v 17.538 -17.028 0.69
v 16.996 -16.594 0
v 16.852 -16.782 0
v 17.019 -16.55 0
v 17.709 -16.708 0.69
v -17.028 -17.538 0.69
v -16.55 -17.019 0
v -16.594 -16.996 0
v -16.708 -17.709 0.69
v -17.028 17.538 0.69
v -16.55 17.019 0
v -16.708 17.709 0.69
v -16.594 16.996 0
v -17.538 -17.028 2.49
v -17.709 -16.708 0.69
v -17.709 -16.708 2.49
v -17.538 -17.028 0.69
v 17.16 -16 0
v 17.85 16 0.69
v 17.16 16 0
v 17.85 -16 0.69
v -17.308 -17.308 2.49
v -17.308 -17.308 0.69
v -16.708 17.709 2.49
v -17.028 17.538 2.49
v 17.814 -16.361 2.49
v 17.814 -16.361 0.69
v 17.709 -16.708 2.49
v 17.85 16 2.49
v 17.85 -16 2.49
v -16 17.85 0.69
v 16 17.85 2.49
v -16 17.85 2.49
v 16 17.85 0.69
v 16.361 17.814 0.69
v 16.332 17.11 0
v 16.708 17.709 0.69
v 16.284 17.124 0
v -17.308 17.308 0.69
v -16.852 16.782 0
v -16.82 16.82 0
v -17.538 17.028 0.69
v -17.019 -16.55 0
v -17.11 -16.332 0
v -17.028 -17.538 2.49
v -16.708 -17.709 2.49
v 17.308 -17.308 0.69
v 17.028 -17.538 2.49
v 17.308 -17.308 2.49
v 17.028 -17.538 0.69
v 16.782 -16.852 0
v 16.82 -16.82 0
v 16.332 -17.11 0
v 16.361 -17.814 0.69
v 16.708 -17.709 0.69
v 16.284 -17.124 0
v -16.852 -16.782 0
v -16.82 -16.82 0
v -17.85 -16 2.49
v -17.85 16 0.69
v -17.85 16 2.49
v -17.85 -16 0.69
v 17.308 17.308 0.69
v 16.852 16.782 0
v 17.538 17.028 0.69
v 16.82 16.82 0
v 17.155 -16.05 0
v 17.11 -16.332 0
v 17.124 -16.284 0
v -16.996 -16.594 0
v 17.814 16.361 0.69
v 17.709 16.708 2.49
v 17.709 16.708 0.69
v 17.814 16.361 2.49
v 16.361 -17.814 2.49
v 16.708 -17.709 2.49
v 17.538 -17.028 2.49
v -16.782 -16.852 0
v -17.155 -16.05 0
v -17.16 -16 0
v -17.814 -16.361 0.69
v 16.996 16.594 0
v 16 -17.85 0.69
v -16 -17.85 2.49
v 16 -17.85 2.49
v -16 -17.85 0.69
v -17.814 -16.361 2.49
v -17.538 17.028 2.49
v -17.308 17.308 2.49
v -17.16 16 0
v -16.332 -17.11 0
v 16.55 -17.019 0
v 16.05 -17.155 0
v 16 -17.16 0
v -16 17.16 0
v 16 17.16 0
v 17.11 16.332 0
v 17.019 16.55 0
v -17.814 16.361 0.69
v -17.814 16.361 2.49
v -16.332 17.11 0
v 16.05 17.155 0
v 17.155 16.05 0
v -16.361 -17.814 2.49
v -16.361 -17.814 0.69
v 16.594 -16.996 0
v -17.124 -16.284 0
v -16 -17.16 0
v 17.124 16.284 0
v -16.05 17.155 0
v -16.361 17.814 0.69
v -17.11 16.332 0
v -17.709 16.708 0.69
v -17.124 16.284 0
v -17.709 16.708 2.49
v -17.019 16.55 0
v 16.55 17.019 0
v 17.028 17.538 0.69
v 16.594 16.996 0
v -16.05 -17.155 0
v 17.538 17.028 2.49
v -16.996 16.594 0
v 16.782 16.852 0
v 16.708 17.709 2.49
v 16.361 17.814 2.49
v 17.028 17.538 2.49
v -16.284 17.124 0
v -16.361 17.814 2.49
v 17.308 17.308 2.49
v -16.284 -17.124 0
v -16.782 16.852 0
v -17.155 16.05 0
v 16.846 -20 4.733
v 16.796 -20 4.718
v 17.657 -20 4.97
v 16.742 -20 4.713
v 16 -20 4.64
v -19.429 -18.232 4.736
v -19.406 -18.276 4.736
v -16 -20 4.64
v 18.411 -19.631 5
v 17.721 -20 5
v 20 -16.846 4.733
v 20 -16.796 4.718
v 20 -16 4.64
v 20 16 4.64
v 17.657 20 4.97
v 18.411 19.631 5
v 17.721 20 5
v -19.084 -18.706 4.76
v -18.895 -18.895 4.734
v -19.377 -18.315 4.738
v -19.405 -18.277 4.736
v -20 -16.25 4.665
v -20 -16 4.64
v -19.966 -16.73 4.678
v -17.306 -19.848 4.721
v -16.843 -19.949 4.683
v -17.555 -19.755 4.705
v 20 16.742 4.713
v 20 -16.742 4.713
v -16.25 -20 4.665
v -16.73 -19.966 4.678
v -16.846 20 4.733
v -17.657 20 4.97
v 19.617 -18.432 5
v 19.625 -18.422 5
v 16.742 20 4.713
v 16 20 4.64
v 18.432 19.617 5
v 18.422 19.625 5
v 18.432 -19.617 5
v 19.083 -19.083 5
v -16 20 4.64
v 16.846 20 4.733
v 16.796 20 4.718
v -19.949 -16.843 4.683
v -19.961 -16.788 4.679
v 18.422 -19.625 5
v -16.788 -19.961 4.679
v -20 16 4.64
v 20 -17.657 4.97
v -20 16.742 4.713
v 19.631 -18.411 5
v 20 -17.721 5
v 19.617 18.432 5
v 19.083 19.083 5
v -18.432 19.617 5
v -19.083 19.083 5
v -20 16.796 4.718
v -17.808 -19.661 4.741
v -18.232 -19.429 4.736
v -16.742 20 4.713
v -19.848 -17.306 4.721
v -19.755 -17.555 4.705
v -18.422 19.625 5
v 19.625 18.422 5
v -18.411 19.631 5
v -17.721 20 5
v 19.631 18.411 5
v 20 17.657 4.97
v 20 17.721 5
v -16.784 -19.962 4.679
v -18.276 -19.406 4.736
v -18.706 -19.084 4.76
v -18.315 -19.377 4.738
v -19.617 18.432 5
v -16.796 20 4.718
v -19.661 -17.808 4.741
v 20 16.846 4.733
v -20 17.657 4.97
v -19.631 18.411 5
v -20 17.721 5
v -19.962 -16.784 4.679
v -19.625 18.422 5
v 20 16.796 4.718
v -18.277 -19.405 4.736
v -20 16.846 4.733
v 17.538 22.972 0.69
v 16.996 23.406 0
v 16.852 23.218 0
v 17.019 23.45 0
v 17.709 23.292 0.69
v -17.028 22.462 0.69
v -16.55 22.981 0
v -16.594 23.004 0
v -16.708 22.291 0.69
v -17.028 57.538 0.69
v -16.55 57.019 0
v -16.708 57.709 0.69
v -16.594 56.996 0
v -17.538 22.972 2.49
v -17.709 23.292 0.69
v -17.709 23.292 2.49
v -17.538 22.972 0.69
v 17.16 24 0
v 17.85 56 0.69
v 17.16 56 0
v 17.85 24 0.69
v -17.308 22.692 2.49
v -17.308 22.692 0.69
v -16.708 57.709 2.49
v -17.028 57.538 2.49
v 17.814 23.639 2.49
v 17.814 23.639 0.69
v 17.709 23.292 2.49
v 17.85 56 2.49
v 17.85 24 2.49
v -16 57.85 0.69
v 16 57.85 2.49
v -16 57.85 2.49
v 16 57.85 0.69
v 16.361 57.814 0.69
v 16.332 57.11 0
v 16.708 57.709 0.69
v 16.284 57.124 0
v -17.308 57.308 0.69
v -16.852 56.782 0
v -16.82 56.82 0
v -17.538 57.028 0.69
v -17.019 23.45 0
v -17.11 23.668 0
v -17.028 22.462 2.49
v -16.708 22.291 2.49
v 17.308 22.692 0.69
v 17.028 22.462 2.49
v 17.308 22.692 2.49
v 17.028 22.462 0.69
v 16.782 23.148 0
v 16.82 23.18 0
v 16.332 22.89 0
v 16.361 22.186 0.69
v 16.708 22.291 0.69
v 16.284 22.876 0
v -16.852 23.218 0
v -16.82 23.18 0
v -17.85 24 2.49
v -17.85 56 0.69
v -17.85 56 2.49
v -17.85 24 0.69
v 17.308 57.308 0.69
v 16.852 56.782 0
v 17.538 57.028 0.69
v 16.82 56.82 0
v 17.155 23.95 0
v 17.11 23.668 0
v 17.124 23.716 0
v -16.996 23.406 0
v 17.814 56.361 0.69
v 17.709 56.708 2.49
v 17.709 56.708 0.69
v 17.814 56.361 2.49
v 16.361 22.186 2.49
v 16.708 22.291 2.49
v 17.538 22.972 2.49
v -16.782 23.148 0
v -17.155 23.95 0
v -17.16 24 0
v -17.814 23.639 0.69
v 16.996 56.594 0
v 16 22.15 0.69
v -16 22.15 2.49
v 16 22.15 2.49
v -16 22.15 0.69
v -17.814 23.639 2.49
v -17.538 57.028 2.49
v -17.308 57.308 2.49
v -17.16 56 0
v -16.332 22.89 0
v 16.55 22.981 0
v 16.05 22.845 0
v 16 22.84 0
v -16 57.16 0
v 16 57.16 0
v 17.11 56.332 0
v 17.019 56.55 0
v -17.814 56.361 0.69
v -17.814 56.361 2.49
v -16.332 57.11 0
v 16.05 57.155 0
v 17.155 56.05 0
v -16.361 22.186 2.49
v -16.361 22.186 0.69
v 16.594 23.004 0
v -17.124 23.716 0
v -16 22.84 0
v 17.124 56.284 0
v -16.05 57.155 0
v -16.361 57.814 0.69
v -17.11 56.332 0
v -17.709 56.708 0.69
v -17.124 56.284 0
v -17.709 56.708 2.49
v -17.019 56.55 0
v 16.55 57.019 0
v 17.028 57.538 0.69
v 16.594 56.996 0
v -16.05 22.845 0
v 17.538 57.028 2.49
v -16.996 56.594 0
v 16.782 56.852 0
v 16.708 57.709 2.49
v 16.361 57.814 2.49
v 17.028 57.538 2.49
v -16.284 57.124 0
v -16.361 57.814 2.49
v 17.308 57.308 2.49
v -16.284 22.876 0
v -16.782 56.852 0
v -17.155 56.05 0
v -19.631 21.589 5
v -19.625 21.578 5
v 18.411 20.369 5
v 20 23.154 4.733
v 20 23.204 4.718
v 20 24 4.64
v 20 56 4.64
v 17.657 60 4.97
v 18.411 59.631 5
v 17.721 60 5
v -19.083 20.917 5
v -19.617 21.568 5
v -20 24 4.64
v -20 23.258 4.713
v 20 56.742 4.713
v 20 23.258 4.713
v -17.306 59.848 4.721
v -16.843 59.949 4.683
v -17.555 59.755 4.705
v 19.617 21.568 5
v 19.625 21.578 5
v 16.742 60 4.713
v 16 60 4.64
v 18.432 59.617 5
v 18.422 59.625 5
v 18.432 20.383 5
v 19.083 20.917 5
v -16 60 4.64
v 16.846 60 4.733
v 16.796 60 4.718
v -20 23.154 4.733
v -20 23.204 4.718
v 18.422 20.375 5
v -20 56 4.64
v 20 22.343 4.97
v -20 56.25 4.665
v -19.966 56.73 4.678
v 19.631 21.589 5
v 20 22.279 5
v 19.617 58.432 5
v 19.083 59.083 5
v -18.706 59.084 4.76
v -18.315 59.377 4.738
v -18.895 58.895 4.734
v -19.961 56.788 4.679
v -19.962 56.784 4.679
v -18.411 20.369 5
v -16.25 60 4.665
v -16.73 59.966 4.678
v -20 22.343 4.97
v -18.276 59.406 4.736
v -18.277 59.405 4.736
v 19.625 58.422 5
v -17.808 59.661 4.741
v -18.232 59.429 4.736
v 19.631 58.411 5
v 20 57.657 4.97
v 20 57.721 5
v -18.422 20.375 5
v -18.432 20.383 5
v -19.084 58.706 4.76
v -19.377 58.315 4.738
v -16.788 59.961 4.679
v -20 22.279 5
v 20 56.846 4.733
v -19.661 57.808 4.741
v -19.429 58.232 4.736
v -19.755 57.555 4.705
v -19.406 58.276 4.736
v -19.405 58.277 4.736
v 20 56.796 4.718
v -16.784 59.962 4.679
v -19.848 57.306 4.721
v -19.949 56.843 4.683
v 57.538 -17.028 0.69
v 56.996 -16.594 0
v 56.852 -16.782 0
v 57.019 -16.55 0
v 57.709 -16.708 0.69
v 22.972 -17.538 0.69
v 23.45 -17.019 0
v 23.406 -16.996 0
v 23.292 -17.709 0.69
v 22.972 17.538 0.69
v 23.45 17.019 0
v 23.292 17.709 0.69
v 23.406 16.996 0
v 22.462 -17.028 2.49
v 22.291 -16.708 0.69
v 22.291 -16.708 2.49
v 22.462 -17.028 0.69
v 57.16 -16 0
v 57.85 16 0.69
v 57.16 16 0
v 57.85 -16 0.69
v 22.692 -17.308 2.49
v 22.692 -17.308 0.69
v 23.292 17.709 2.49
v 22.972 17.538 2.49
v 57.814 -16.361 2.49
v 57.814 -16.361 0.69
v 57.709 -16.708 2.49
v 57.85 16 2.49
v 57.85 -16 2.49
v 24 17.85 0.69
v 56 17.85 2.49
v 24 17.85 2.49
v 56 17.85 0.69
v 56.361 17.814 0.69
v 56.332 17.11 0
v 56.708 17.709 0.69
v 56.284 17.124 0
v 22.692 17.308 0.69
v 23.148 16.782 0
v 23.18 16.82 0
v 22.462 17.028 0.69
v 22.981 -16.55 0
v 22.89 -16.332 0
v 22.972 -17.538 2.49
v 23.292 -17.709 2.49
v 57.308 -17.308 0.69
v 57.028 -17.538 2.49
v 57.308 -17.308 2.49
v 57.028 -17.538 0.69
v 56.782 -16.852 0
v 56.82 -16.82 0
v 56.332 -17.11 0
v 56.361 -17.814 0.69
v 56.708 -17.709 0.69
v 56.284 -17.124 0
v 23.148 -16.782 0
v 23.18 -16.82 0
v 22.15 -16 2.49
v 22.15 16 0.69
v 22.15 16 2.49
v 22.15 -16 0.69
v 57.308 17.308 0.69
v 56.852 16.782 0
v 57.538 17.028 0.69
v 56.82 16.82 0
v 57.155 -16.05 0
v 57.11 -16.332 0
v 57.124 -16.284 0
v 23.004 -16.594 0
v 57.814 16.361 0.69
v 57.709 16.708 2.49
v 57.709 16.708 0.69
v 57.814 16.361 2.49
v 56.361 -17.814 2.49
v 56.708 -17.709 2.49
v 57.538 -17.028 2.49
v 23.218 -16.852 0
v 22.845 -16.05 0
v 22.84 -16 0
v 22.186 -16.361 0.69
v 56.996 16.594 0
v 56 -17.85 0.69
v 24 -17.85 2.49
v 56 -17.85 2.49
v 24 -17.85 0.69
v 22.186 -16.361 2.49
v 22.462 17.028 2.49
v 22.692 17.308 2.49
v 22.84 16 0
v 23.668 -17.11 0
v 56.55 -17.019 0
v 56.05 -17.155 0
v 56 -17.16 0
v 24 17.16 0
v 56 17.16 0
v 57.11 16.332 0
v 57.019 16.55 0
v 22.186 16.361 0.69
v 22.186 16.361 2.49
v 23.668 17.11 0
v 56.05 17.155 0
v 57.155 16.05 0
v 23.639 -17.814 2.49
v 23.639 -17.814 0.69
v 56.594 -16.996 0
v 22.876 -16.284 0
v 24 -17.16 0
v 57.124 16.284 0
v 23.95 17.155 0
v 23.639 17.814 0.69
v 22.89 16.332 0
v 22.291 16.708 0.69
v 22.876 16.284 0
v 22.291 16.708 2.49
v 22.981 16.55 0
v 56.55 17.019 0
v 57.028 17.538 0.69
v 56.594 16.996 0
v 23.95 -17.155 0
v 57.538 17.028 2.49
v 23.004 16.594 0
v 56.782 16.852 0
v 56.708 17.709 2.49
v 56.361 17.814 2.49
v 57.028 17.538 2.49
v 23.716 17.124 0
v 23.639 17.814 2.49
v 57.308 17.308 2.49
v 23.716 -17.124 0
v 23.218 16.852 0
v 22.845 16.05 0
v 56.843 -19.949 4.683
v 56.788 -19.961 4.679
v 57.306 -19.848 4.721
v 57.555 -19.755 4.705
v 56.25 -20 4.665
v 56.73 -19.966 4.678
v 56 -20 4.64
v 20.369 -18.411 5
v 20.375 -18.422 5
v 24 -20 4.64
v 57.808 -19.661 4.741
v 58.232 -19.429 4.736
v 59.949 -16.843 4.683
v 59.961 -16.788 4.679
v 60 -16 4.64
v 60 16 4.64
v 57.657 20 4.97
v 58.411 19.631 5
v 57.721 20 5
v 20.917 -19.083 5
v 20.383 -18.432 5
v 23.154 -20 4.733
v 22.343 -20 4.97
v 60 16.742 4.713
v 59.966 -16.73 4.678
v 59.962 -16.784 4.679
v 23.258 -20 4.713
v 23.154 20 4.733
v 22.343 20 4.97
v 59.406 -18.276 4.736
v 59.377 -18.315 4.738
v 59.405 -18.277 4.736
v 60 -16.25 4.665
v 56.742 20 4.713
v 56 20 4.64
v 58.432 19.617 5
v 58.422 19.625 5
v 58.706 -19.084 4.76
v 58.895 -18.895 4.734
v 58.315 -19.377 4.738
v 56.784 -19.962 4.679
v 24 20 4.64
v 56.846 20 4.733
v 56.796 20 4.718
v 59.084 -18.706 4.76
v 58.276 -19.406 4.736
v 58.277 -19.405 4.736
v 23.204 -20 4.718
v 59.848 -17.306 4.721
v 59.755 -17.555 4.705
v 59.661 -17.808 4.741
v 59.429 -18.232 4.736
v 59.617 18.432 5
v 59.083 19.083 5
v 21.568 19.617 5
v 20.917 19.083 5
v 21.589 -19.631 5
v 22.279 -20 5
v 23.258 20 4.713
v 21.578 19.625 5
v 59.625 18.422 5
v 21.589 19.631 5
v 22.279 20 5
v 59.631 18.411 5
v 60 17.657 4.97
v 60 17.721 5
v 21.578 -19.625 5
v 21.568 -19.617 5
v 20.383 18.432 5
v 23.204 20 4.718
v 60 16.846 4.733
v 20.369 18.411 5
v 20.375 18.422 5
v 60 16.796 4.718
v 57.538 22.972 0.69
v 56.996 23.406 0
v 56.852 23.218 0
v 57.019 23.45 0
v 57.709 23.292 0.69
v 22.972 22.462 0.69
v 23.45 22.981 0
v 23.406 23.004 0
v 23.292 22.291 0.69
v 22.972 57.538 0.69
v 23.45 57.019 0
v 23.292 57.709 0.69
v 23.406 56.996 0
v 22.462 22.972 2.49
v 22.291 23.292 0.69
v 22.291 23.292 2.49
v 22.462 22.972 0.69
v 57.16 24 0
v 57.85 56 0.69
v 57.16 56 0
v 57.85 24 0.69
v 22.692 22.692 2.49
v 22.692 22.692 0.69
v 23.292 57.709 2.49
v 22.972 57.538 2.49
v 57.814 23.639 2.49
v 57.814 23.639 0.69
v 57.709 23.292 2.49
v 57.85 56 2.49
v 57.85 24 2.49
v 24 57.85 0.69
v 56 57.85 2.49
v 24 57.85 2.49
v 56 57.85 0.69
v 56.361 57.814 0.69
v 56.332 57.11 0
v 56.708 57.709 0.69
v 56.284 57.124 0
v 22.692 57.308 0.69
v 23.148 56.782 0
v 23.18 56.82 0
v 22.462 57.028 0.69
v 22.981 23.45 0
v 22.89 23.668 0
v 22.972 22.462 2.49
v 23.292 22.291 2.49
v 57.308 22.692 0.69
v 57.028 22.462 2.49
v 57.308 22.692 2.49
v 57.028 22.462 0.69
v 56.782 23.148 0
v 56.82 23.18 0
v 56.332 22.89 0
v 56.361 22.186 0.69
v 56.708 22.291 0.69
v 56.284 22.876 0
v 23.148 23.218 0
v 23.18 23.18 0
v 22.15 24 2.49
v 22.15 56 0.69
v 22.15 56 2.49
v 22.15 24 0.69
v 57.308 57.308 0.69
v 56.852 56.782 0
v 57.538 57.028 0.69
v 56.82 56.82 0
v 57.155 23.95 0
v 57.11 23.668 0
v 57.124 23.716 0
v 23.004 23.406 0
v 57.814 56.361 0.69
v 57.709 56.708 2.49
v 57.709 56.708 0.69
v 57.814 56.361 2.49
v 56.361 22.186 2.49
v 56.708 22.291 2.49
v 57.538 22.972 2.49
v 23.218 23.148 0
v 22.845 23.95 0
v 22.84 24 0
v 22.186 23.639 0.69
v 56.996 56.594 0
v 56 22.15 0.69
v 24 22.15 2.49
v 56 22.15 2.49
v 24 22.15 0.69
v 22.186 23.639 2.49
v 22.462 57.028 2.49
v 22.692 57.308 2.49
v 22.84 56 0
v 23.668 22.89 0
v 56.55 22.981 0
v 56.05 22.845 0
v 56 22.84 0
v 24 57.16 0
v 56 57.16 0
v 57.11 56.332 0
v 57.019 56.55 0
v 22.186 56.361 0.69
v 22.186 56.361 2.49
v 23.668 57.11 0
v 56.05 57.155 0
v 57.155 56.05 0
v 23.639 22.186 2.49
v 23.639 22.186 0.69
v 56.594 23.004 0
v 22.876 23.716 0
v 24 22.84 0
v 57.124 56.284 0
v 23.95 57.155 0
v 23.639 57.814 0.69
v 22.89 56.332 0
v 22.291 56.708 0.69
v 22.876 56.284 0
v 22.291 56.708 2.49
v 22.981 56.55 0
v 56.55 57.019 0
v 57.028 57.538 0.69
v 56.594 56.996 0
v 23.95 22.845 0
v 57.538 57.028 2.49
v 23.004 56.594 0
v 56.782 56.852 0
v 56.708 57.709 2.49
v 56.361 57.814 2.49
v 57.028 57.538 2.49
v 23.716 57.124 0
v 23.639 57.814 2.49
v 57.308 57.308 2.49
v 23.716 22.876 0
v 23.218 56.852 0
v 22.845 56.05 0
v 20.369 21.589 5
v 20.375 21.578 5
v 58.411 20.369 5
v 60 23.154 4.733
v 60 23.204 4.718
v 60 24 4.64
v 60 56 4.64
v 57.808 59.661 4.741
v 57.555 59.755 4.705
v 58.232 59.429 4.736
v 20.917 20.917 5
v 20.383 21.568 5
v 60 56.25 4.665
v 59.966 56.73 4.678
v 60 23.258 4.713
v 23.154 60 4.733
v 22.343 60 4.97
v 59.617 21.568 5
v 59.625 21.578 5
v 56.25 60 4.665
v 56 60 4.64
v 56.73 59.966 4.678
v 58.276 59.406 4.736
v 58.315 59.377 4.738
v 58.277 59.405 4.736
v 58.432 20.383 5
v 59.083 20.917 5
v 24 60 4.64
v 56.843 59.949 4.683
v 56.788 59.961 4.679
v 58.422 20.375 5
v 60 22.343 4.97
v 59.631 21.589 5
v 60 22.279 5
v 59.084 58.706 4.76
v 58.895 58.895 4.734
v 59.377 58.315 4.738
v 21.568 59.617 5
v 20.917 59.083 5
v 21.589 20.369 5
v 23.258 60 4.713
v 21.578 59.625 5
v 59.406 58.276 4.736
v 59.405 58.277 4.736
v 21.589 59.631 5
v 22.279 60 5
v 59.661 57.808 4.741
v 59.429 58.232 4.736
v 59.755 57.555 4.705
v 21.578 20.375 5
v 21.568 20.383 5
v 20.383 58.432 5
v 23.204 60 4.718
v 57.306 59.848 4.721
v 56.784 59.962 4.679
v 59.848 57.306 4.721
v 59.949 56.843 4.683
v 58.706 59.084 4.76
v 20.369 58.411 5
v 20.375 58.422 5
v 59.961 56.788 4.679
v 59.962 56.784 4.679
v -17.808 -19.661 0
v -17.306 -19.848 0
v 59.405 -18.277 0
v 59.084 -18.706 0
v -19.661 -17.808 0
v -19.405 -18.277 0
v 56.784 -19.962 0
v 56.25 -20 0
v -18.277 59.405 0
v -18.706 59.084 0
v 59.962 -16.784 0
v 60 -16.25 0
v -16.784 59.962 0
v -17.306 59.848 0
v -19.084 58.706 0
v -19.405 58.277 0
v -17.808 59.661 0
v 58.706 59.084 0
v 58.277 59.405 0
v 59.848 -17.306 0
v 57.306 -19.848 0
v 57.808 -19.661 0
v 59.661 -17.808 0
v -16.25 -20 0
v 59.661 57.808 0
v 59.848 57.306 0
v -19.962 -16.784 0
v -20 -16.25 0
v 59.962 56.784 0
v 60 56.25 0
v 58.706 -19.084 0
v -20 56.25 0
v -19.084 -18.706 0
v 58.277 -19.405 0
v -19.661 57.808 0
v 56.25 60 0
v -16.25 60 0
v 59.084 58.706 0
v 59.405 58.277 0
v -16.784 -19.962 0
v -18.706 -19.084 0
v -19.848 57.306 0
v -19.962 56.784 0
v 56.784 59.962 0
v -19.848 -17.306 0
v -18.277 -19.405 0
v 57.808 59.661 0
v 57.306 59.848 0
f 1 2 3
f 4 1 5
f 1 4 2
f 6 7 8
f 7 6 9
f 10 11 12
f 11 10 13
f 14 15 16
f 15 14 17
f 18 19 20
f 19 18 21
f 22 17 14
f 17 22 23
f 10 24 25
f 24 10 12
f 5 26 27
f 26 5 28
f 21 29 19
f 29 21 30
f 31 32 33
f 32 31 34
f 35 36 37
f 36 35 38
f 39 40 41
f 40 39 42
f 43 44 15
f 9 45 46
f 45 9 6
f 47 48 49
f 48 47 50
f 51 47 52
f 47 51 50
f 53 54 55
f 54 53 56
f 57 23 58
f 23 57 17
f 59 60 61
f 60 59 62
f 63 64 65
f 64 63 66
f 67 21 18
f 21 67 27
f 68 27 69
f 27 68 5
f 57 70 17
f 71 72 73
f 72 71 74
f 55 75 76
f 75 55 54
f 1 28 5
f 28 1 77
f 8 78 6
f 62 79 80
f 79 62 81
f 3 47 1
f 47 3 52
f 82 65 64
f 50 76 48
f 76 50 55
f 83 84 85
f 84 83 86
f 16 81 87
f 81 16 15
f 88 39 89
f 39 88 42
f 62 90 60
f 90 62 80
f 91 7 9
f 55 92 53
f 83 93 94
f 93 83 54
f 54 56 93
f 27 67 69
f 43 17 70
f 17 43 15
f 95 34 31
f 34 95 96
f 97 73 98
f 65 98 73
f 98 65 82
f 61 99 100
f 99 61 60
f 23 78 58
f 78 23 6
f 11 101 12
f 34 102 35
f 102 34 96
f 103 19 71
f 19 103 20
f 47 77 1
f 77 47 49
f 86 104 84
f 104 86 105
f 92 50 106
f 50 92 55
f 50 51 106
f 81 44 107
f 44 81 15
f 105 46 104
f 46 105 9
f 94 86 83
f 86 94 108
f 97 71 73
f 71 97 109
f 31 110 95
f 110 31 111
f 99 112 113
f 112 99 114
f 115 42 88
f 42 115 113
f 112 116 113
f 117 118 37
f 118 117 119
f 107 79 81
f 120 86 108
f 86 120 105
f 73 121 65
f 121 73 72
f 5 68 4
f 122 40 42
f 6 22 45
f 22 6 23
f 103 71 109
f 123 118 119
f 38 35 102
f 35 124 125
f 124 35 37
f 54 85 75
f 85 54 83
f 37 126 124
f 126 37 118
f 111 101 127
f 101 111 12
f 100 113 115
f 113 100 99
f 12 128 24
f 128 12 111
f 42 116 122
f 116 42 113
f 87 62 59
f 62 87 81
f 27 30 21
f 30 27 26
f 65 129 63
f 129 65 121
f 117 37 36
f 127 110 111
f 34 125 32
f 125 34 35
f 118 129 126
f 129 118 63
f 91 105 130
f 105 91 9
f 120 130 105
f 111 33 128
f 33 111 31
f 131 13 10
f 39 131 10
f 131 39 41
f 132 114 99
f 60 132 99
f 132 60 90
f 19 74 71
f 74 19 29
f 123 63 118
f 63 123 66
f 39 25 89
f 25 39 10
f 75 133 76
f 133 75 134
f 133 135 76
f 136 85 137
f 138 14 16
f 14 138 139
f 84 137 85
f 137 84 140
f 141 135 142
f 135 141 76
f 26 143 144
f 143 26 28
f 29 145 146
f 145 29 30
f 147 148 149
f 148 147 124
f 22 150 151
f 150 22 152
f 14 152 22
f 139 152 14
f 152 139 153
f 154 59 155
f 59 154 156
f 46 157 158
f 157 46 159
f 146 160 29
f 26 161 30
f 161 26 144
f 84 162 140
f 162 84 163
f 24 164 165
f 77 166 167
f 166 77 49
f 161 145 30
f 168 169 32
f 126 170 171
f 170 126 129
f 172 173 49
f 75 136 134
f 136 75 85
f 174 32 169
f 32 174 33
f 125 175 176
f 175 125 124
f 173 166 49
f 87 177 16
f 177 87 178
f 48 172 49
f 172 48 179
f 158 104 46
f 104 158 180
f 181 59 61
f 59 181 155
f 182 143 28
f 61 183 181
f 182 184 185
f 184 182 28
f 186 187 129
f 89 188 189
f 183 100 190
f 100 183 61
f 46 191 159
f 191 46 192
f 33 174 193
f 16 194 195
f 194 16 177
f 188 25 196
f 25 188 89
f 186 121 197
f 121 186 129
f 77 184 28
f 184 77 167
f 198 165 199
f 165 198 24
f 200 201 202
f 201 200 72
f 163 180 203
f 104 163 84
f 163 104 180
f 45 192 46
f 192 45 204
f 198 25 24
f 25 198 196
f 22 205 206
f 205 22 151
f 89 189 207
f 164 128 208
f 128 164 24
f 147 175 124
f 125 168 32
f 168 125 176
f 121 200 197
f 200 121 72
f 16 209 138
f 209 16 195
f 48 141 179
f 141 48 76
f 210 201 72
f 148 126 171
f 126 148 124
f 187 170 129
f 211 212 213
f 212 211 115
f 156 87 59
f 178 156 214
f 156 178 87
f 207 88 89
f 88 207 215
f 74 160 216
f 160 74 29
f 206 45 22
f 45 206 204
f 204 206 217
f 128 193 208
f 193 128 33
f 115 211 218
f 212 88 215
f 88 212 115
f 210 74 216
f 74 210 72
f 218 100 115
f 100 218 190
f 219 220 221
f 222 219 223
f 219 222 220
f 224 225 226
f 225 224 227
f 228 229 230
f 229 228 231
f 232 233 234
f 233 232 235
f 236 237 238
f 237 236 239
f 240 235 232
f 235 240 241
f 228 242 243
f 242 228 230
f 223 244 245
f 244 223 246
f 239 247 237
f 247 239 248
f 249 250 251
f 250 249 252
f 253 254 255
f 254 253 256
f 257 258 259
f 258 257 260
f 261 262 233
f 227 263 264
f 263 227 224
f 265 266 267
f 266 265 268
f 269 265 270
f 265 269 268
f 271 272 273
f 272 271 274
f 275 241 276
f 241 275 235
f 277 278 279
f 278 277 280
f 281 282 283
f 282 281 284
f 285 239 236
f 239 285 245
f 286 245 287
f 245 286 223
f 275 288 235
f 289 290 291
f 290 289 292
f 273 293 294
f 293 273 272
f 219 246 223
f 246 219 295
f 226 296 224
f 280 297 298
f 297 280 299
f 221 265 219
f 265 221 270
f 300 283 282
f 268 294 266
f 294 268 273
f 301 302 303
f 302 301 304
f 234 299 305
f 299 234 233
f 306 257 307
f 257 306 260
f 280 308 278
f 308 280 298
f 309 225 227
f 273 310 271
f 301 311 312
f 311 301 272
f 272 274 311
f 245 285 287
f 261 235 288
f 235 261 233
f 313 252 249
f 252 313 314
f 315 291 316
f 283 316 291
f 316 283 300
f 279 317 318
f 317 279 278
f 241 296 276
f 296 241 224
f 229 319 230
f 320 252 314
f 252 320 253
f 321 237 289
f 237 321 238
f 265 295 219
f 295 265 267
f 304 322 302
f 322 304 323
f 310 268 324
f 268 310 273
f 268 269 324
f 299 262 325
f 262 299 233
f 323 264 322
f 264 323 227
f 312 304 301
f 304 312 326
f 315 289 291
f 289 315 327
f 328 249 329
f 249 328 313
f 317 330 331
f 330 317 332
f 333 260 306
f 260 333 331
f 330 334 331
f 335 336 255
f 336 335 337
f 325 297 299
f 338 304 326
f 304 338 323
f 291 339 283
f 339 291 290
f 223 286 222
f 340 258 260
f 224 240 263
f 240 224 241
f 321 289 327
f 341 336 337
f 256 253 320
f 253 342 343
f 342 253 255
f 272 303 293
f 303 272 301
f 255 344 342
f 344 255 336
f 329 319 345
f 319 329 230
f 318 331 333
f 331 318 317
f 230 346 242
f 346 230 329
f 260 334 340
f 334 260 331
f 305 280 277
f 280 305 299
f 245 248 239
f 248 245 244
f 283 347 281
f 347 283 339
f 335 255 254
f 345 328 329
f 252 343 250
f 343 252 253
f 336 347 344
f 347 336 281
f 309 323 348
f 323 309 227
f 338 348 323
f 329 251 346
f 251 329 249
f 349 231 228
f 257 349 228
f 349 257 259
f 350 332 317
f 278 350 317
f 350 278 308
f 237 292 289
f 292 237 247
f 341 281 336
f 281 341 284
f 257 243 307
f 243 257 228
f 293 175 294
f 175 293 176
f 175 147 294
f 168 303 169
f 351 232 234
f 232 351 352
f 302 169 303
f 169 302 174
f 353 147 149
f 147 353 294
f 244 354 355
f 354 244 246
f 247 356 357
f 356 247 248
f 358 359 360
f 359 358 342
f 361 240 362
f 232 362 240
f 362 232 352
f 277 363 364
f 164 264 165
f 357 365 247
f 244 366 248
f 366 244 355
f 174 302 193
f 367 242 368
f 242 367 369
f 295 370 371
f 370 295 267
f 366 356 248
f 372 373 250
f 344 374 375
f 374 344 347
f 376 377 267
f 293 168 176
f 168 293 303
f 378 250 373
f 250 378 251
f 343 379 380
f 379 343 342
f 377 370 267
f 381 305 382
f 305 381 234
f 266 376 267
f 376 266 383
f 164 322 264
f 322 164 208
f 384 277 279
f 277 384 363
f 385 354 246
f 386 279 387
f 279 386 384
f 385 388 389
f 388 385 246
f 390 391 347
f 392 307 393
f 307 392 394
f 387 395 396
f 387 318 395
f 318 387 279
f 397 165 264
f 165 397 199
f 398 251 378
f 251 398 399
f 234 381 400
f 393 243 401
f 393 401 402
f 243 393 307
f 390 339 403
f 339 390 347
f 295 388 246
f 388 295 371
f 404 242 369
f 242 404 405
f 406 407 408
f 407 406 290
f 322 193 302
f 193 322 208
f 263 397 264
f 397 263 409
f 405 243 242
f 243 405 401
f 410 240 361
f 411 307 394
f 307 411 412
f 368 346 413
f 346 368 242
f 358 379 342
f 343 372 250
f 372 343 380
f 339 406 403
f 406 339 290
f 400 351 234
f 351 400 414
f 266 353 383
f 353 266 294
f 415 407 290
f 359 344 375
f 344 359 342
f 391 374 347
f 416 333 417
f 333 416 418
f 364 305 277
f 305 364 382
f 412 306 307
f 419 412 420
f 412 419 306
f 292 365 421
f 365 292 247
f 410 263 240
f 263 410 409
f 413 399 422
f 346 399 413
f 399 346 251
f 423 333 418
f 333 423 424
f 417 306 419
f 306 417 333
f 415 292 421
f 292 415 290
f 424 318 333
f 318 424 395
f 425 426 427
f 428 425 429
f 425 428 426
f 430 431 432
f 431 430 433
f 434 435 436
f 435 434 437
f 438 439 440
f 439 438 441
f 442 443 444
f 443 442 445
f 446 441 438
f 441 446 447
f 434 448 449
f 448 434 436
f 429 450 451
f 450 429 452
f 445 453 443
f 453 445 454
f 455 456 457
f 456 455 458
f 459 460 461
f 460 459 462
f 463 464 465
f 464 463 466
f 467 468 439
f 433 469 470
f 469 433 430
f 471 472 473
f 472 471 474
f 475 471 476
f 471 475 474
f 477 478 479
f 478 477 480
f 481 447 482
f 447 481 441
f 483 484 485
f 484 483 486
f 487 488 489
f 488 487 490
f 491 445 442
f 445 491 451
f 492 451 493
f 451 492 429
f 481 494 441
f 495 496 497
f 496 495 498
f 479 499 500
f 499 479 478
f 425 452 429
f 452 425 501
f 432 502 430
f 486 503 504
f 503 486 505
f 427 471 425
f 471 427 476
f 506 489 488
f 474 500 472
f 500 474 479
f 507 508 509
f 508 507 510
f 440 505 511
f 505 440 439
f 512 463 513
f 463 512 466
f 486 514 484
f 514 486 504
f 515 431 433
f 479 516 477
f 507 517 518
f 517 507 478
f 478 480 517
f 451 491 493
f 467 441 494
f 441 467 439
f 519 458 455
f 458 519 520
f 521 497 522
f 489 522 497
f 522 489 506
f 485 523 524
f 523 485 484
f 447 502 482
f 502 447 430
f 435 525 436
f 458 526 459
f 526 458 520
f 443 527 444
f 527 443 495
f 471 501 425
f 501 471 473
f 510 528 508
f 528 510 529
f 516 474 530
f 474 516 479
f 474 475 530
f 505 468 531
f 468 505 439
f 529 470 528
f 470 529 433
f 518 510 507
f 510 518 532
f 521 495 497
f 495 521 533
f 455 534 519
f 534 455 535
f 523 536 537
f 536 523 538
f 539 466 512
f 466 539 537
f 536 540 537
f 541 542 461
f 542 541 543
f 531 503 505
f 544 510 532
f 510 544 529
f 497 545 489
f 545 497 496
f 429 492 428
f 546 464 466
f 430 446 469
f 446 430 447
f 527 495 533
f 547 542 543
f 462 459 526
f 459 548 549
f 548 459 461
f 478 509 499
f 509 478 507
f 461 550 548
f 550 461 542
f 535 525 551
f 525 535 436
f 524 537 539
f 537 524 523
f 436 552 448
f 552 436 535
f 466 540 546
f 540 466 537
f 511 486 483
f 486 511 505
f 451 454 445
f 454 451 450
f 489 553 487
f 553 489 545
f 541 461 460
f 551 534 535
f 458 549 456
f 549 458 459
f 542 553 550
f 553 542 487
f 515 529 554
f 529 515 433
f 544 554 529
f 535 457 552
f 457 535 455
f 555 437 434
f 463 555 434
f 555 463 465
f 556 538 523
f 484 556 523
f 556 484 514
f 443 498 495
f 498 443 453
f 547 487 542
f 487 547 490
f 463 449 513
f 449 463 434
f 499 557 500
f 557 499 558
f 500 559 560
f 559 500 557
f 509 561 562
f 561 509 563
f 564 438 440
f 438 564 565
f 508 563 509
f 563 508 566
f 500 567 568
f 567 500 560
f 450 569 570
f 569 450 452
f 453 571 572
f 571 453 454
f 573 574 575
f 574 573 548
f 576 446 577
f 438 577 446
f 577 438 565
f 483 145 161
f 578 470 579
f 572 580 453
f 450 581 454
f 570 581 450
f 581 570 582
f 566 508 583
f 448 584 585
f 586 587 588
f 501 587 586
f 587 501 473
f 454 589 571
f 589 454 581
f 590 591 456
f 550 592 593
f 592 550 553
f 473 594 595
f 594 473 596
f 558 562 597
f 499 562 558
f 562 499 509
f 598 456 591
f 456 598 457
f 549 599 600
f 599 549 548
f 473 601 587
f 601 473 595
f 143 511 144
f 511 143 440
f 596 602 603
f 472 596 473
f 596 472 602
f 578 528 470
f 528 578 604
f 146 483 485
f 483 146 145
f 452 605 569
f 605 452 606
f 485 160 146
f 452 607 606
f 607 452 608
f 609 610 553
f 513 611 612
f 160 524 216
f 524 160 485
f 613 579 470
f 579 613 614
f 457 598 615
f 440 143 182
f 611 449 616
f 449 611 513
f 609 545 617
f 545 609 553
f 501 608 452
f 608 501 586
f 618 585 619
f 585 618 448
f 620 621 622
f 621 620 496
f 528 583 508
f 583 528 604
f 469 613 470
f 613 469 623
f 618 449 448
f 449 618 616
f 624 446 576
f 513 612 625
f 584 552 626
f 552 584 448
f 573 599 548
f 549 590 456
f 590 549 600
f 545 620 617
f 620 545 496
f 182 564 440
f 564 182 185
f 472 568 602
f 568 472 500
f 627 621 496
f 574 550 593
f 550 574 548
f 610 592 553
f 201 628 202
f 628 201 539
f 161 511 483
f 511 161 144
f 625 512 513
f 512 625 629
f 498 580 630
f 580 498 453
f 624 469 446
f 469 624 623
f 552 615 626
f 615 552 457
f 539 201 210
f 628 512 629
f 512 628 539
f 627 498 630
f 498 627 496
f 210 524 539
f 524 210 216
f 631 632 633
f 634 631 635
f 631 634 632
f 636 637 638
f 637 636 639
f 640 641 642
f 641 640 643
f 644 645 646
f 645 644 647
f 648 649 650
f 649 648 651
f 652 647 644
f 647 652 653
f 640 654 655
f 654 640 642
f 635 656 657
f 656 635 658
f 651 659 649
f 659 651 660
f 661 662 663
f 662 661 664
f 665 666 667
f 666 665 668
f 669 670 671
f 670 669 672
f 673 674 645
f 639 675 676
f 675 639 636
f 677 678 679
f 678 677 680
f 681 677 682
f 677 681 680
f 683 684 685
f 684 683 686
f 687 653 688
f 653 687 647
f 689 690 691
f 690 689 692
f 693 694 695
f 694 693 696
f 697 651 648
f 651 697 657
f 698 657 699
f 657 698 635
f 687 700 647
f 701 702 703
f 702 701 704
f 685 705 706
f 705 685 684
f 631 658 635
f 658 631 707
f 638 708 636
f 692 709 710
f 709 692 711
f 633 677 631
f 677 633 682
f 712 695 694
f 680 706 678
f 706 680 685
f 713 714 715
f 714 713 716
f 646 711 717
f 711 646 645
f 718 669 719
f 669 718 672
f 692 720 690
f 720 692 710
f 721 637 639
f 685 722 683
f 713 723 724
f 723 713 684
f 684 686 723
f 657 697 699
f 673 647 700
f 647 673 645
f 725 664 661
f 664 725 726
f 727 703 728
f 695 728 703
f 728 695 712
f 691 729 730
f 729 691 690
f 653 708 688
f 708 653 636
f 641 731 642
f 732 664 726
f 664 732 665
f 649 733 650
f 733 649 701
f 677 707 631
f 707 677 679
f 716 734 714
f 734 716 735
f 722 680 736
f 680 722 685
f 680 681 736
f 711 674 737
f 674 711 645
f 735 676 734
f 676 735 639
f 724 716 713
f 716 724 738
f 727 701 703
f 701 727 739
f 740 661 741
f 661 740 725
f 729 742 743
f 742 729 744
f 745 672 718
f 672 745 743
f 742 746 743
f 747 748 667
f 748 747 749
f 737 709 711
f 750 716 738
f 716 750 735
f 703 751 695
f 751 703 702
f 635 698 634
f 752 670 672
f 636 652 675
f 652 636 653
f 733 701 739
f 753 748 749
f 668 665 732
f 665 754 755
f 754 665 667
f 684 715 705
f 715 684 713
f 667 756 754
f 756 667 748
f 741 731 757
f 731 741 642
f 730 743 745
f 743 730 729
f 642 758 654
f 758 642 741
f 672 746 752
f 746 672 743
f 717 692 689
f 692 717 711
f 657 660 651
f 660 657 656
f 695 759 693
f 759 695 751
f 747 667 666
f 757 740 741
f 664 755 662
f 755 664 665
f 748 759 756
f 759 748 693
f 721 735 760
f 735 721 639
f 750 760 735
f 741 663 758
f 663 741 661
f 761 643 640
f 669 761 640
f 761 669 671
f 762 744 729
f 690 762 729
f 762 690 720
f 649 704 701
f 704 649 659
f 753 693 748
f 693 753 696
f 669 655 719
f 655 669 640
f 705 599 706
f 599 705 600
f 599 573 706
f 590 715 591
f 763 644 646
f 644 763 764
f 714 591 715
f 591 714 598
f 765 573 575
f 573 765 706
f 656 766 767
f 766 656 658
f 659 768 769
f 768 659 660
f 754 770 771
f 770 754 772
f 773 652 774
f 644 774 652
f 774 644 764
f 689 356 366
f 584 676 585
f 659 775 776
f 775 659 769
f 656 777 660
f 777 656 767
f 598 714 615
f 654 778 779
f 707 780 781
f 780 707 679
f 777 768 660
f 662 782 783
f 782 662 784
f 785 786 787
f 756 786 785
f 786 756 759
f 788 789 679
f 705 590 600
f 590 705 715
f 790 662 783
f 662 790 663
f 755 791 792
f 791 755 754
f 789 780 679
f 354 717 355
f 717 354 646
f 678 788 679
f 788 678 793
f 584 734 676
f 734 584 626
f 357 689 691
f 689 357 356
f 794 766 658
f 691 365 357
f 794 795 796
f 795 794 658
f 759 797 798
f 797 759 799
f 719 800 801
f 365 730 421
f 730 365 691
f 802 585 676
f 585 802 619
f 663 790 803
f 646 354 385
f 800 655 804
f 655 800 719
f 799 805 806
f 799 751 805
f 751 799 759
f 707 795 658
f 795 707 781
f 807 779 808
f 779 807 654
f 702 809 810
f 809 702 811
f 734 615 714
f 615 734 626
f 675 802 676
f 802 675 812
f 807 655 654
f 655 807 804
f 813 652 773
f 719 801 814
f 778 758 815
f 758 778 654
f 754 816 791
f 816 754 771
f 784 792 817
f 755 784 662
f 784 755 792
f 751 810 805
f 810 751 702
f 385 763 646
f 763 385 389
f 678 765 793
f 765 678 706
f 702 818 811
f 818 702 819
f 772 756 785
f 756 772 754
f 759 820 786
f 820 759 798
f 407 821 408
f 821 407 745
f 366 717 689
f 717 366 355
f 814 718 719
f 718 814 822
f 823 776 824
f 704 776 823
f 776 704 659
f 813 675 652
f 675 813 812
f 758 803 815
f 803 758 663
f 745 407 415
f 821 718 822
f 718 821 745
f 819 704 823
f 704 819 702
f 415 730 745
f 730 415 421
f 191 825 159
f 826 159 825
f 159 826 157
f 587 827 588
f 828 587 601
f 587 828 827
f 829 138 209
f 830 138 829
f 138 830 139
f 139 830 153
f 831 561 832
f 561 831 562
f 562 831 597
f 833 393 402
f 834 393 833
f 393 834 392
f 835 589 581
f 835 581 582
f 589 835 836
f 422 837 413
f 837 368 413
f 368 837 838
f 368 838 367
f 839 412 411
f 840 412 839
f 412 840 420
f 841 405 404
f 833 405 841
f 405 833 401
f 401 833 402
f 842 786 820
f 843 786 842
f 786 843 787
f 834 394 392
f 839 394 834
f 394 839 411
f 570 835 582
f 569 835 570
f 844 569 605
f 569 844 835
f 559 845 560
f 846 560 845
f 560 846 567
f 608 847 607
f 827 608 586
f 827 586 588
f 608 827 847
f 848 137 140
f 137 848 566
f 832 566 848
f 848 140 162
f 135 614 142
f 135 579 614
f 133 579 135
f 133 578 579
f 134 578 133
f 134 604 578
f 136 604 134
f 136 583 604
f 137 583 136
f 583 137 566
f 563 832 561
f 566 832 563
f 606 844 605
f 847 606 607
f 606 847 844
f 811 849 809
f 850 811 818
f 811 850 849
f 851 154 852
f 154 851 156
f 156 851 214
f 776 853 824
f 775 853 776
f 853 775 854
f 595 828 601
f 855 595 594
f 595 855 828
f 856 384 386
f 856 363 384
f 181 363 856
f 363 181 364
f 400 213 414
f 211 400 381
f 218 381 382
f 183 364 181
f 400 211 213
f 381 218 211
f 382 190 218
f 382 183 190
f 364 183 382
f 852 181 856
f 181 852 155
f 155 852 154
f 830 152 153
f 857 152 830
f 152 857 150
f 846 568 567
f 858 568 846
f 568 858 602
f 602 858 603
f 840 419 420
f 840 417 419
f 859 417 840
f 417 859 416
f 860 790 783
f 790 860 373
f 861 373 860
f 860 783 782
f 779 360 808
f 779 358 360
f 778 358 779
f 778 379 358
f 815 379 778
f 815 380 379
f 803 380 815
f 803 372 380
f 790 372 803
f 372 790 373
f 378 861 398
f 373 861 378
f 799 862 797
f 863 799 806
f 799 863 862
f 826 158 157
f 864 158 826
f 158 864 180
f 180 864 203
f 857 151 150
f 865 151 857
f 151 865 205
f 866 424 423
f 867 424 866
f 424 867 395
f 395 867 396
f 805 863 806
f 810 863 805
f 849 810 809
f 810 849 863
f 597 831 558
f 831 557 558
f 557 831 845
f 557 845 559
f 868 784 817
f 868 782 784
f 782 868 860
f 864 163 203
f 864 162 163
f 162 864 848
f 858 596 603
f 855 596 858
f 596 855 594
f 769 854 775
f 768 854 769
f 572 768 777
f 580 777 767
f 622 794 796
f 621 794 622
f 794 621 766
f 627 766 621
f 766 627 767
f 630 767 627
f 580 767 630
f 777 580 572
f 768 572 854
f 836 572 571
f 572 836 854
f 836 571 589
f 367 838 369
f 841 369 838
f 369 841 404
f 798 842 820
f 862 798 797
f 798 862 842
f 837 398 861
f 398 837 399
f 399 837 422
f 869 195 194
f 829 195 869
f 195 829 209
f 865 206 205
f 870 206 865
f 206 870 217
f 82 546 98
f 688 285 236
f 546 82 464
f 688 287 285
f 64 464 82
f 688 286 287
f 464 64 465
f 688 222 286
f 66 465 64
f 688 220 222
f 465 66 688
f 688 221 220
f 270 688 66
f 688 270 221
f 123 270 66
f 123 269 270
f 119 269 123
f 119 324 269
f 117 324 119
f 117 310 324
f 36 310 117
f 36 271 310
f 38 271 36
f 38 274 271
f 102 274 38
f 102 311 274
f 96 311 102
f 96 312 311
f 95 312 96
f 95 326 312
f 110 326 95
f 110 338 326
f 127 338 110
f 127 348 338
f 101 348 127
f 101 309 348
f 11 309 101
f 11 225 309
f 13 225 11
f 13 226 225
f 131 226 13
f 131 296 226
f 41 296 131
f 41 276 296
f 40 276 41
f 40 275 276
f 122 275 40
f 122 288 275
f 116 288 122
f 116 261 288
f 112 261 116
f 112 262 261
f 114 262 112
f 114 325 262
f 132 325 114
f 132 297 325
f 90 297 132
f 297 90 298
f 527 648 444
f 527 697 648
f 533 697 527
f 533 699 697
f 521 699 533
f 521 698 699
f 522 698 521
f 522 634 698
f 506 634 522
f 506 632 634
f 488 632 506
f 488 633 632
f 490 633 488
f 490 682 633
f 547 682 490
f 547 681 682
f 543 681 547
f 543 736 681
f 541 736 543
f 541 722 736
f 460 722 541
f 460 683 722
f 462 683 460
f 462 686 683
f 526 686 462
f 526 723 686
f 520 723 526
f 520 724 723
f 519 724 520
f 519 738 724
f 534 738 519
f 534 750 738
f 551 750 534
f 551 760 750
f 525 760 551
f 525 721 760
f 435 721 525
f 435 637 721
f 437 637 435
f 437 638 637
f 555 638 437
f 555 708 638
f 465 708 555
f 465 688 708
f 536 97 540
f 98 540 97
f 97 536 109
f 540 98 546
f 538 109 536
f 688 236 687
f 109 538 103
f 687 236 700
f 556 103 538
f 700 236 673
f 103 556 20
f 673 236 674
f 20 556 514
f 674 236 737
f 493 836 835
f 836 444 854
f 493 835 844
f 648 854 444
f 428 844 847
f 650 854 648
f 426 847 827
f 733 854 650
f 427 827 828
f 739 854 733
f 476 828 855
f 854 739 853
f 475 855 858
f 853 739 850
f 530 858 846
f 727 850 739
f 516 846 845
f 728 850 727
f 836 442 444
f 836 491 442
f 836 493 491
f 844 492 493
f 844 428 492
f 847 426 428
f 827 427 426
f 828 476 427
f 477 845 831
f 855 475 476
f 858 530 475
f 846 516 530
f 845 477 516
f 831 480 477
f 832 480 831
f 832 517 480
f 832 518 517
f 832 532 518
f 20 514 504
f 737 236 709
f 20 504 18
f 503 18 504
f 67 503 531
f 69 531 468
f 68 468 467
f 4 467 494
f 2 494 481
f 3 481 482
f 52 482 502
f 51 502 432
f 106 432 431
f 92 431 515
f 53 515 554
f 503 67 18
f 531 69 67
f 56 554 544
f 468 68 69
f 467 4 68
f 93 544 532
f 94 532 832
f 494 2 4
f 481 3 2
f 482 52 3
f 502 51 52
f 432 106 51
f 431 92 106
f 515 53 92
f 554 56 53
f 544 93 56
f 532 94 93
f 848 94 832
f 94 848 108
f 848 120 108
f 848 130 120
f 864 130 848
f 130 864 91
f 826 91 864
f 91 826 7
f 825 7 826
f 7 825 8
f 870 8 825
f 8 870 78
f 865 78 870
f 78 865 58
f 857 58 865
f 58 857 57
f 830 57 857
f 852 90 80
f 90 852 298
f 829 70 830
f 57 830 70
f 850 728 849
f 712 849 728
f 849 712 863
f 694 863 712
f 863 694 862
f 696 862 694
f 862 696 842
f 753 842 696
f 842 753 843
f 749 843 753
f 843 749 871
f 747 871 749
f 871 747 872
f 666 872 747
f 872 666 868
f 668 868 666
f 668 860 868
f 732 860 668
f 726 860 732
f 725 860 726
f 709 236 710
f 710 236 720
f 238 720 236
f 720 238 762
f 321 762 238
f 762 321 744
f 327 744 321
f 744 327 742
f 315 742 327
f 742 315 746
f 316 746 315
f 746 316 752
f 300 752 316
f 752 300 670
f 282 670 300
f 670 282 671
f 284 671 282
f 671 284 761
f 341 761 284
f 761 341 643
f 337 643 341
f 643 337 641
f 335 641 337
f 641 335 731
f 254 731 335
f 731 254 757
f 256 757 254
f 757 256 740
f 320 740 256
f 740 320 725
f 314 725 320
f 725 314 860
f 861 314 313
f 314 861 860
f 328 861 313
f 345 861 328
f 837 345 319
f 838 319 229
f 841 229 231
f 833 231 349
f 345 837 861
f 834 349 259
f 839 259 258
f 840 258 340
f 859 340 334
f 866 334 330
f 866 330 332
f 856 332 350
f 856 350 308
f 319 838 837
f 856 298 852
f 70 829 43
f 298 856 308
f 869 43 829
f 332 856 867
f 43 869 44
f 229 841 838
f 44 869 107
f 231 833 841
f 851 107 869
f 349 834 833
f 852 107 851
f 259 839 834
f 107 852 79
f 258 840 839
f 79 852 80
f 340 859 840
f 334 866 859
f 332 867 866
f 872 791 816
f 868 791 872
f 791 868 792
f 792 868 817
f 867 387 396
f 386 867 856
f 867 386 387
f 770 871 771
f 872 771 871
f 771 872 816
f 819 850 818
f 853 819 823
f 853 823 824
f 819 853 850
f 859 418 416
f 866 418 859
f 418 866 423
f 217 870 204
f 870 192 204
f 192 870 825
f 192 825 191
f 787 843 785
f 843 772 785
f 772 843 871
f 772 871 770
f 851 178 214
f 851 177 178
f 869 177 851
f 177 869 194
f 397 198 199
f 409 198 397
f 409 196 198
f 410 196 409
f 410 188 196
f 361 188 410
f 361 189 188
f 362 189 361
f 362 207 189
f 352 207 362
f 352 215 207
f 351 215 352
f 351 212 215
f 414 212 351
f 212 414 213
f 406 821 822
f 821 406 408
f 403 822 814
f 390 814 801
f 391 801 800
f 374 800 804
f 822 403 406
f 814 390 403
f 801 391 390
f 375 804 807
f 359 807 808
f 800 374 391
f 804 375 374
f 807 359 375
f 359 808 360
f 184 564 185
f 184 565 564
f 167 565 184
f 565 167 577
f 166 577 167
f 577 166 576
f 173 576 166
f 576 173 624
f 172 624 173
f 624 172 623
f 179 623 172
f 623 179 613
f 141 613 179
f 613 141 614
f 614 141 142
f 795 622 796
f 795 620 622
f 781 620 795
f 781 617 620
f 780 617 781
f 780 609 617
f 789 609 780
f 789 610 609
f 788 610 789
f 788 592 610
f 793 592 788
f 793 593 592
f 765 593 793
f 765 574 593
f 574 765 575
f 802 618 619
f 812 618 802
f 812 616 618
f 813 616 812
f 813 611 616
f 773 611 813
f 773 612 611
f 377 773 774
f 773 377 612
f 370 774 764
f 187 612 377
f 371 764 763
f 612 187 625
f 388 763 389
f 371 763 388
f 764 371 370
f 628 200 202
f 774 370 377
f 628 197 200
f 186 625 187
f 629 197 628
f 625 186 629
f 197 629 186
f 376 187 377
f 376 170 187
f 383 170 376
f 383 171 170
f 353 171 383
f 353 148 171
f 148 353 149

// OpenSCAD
// include instead of use, so we get the pitch
include <gridfinity_modules.scad>

xsize = 2;
xfactor = 1;
ysize = 2;
weighted = false;
lid = false;

if (lid) {
  base_lid(xsize, ysize);
}
else if (weighted) {
  weighted_baseplate(xsize, ysize);
}
else {
  frame_plain(xsize, ysize, xfactor=xfactor);
}


module base_lid(num_x, num_y) {
  magnet_od = 6.5;
  magnet_position = min(gridfinity_pitch/2-8, gridfinity_pitch/2-4-magnet_od/2);
  magnet_thickness = 2.4;
  eps = 0.1;
  
  translate([0, 0, 7]) frame_plain(xsize, ysize, trim=0.25);
  difference() {
    grid_block(xsize, ysize, 1, magnet_diameter=0, screw_depth=0);
    gridcopy(num_x, num_y) {
      cornercopy(magnet_position) {
        translate([0, 0, 7-magnet_thickness])
        cylinder(d=magnet_od, h=magnet_thickness+eps, $fn=48);
      }
    }
  }
}


module weighted_baseplate(num_x, num_y) {
  magnet_od = 6.5;
  magnet_position = min(gridfinity_pitch/2-8, gridfinity_pitch/2-4-magnet_od/2);
  magnet_thickness = 2.4;
  eps = 0.1;
  
  difference() {
    frame_plain(num_x, num_y, 6.4);
    
    gridcopy(num_x, num_y) {
      cornercopy(magnet_position) {
        translate([0, 0, -magnet_thickness])
        cylinder(d=magnet_od, h=magnet_thickness+eps, $fn=48);
        
        translate([0, 0, -6.4]) cylinder(d=3.5, h=6.4, $fn=24);
        
        // counter-sunk holes in the bottom
        translate([0, 0, -6.41]) cylinder(d1=8.5, d2=3.5, h=2.5, $fn=24);
      }
      
      translate([-10.7, -10.7, -6.41]) cube([21.4, 21.4, 4.01]);
      
      for (a2=[0,90]) rotate([0, 0, a2])
      hull() for (a=[0, 180]) rotate([0, 0, a])
      translate([-14.9519, 0, -6.41]) cylinder(d=8.5, h=2.01, $fn=24);
    }
  }
}


module frame_plain(num_x, num_y, extra_down=0, trim=0, xfactor=1) {
  ht = extra_down > 0 ? 4.4 : 5;
  corner_radius = 3.75;
  corner_position = gridfinity_pitch/2-corner_radius-trim;
  difference() {
    hull() cornercopy(corner_position, num_x * xfactor, num_y) 
    translate([0, 0, -extra_down]) cylinder(r=corner_radius, h=ht+extra_down, $fn=44);
    translate([0, 0, trim ? 0 : -0.01]) 
    render() gridcopy(num_x, num_y, xfactor) pad_oversize(margins=1, xfactor=xfactor);
  }
}
